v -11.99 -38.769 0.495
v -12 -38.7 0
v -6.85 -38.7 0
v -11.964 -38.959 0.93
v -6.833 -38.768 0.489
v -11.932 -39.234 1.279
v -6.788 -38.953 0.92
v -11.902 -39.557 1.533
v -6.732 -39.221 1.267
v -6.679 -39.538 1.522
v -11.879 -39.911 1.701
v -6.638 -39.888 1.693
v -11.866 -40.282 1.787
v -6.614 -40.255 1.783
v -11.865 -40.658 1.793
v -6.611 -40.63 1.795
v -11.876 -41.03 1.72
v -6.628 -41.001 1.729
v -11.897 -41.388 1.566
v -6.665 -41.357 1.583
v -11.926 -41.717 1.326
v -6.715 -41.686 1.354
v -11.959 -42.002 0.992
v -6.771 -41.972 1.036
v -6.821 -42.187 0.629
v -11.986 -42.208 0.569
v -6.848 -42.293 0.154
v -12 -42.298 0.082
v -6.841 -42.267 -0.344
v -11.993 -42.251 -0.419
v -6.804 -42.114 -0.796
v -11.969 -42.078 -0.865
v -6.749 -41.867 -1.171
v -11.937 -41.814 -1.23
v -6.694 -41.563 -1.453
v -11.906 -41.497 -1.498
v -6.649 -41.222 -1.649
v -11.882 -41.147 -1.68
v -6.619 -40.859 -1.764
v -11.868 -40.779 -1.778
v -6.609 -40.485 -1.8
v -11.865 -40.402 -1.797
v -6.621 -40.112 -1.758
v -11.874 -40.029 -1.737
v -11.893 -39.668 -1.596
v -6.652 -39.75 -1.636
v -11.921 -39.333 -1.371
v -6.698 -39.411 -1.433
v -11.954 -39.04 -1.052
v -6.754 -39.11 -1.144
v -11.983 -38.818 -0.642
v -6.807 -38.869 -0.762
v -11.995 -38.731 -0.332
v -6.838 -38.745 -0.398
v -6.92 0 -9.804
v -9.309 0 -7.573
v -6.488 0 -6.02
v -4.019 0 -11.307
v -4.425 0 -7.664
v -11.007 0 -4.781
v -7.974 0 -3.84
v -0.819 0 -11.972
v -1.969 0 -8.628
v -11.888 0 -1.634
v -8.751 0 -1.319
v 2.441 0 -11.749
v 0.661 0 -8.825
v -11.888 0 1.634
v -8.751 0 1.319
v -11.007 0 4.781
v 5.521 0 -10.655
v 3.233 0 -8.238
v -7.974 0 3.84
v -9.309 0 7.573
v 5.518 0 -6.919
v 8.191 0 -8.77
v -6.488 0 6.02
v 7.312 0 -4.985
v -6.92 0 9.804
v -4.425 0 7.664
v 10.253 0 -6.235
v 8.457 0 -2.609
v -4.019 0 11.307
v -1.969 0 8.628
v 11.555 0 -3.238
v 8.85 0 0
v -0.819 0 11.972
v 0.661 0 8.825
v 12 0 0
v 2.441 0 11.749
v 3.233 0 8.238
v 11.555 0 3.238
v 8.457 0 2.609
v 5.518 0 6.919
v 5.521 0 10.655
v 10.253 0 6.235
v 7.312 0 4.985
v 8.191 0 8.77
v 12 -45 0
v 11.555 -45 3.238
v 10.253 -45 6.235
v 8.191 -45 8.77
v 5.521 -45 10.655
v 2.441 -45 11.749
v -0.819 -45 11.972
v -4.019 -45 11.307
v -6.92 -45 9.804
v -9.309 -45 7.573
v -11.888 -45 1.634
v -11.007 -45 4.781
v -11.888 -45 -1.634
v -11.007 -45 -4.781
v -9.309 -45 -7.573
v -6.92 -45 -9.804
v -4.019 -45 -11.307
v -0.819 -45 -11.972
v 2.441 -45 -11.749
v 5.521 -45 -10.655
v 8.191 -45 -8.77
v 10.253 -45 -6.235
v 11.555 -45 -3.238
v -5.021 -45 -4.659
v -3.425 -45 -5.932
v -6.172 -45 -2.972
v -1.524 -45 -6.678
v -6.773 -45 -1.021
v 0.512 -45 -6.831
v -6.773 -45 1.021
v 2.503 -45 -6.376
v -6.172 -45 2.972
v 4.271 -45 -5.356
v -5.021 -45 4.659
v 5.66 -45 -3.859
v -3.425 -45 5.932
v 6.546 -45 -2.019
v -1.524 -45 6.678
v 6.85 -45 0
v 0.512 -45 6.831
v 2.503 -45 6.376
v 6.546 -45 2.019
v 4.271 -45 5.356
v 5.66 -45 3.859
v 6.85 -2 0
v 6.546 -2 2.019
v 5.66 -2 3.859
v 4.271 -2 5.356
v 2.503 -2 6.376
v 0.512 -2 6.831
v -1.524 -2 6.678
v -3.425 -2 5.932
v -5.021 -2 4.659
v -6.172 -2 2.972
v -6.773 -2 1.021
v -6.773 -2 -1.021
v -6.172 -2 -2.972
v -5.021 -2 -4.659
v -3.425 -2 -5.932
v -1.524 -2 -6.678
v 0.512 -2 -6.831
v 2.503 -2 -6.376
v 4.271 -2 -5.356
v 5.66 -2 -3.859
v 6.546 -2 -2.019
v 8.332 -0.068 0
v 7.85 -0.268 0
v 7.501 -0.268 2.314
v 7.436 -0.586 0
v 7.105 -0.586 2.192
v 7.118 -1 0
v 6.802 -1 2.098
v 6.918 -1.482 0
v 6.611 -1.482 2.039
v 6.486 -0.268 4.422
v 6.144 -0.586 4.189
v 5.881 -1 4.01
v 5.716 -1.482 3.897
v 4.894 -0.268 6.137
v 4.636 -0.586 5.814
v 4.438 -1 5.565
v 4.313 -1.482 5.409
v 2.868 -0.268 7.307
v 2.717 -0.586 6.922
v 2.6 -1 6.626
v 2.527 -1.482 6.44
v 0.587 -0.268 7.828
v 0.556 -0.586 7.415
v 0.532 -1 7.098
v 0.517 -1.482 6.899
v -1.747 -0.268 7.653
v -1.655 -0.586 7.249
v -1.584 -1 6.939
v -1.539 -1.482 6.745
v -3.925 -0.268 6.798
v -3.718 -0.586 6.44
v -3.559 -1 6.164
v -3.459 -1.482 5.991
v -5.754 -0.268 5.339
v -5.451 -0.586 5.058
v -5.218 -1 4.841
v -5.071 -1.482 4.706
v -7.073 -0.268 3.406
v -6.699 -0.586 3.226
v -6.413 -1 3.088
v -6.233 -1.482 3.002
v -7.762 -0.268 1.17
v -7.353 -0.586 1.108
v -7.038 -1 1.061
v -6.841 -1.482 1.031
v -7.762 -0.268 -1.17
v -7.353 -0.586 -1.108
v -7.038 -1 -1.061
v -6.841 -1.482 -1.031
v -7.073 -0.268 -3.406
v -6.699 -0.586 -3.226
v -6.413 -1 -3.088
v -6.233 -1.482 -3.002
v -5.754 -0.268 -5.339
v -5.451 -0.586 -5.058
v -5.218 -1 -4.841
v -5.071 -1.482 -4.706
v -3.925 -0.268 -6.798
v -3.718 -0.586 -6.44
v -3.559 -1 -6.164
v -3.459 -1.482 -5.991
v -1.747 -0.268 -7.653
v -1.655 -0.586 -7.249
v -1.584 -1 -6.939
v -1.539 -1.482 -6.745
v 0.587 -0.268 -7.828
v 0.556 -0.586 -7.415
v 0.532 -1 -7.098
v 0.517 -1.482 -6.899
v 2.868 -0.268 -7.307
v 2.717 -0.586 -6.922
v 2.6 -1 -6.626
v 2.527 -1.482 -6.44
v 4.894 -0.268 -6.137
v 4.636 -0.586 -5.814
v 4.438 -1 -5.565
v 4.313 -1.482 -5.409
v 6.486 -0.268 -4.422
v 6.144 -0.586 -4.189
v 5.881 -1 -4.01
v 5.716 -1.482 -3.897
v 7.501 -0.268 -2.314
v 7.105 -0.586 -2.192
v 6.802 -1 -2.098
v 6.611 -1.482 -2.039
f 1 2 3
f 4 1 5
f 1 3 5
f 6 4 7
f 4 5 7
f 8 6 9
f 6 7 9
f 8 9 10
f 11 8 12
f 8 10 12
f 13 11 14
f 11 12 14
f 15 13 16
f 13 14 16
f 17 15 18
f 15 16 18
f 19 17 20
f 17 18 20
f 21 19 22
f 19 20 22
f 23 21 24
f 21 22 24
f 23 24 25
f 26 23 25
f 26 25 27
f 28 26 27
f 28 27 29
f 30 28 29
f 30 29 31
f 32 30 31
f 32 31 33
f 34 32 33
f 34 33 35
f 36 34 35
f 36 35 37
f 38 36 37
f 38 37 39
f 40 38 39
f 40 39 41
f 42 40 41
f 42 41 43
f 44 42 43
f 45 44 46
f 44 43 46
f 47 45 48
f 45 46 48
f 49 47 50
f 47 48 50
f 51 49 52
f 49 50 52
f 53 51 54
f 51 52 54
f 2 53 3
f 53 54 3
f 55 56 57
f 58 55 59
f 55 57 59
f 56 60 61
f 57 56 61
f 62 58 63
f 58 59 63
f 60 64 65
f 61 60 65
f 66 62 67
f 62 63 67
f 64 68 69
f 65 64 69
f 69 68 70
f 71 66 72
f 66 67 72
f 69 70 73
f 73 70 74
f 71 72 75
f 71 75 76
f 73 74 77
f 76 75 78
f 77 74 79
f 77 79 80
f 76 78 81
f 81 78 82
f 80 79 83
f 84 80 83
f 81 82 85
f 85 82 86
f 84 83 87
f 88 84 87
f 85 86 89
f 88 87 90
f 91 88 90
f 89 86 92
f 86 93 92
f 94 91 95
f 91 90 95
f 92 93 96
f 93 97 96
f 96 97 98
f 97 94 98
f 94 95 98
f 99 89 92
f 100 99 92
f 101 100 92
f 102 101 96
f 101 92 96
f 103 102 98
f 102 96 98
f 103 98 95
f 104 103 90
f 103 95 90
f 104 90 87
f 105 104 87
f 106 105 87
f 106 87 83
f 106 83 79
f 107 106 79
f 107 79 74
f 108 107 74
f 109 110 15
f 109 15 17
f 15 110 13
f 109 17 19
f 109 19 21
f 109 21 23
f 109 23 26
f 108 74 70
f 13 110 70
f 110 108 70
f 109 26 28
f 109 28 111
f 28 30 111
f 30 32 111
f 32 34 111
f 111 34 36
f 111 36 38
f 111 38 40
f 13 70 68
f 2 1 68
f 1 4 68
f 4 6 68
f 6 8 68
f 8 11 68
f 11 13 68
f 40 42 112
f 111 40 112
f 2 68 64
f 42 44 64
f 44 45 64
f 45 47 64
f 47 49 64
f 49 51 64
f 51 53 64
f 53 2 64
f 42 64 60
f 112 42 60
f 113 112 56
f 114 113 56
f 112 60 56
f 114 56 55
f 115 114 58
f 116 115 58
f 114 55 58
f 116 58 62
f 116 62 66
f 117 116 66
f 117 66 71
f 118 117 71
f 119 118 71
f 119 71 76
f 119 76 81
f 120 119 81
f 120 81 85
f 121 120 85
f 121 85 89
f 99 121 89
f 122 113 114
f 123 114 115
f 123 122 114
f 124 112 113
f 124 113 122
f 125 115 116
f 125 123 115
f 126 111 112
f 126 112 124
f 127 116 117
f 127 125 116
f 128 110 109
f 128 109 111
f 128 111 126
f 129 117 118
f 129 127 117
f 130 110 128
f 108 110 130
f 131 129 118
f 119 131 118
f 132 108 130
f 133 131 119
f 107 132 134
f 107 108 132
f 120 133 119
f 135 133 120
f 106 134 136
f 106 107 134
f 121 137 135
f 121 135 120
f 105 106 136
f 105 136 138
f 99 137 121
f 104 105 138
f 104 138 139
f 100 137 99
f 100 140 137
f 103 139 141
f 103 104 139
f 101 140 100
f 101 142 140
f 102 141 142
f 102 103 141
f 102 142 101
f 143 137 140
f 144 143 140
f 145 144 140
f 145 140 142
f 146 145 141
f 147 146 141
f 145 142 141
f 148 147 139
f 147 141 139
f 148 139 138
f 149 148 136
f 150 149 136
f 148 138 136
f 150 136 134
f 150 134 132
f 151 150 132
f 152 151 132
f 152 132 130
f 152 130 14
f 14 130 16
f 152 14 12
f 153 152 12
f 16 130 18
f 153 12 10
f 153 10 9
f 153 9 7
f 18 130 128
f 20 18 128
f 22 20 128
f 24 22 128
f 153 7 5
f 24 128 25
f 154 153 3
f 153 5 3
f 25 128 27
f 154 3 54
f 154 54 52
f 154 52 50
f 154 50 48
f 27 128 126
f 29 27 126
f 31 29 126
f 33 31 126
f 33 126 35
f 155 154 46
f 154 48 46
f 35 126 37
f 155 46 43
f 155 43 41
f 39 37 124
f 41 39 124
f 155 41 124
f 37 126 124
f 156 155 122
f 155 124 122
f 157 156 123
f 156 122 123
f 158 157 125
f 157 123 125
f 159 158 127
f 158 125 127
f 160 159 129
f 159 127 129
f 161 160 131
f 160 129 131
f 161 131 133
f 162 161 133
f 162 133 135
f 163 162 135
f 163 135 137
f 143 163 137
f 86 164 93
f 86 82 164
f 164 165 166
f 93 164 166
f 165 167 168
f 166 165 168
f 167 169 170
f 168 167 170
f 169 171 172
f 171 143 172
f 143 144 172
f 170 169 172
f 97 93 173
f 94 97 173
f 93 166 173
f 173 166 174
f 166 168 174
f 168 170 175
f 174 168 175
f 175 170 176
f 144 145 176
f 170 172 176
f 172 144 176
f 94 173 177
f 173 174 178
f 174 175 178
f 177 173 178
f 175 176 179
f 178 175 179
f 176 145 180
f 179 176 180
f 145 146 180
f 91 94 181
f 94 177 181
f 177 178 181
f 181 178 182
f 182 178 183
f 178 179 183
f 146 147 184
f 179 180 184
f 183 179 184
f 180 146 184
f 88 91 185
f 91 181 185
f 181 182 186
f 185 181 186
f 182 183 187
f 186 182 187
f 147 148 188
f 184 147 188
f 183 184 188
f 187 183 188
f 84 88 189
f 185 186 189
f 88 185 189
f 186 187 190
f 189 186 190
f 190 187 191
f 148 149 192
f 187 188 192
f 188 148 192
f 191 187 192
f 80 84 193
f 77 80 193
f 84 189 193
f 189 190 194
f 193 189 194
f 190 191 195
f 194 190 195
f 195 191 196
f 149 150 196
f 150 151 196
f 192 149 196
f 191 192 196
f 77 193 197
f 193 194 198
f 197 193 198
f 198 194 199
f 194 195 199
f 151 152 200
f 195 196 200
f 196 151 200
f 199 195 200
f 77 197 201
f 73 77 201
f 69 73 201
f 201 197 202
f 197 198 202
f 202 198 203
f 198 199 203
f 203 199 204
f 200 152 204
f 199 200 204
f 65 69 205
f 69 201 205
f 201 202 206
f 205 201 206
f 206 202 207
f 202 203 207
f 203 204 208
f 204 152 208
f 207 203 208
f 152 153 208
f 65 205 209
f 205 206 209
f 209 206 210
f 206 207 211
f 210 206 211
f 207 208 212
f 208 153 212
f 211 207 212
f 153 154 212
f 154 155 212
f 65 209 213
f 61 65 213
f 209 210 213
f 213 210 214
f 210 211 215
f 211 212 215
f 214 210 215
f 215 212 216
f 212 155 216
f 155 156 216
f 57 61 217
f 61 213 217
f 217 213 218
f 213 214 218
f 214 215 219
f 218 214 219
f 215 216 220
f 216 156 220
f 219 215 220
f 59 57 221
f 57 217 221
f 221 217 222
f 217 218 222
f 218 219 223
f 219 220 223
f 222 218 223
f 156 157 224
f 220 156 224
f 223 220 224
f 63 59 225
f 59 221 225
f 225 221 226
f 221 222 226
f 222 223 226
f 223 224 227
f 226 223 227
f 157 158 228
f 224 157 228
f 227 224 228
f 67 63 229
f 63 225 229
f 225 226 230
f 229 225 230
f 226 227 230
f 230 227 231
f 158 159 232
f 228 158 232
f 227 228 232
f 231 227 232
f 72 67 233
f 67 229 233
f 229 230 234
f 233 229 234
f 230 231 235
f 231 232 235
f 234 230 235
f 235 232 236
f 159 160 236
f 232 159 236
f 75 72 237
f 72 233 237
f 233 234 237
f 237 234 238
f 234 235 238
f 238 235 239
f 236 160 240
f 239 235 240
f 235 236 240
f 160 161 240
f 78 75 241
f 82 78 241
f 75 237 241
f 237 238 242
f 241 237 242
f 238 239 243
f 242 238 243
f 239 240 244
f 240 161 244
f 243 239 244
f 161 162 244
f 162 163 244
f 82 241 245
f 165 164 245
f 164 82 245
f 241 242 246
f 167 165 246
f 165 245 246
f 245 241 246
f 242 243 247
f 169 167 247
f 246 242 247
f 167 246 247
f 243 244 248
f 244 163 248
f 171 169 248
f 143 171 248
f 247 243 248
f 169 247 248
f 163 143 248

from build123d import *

# Parameters (mm, degrees)
F0_R     = 12
F1_DEPTH = 45
F2_R     = 6.85
F3_DEPTH = 50
F4_R     = 1.8
F5_DEPTH = 25
F6_R     = 2


with BuildPart() as f1:
    # F0 (on Front) → F1 (new body)
    with BuildSketch(Plane.XZ):
        Circle(F0_R)
    extrude(amount=F1_DEPTH)

    # F2 (on face) → F3 (cut)
    with BuildSketch(Plane.XZ.offset(45)):
        Circle(F2_R)
    extrude(amount=-F3_DEPTH, mode=Mode.SUBTRACT)

    # F4 (on Right) → F5 (cut)
    with BuildSketch(Plane.YZ):
        with Locations((-40.5, 0)):
            Circle(F4_R)
    extrude(amount=-F5_DEPTH, mode=Mode.SUBTRACT)

    # F6
    f6_edges = [f1.edges().sort_by_distance(p)[0] for p in [
        (-6.85, 0, 0),
    ]]
    fillet(f6_edges, radius=F6_R)


solid = f1.part
